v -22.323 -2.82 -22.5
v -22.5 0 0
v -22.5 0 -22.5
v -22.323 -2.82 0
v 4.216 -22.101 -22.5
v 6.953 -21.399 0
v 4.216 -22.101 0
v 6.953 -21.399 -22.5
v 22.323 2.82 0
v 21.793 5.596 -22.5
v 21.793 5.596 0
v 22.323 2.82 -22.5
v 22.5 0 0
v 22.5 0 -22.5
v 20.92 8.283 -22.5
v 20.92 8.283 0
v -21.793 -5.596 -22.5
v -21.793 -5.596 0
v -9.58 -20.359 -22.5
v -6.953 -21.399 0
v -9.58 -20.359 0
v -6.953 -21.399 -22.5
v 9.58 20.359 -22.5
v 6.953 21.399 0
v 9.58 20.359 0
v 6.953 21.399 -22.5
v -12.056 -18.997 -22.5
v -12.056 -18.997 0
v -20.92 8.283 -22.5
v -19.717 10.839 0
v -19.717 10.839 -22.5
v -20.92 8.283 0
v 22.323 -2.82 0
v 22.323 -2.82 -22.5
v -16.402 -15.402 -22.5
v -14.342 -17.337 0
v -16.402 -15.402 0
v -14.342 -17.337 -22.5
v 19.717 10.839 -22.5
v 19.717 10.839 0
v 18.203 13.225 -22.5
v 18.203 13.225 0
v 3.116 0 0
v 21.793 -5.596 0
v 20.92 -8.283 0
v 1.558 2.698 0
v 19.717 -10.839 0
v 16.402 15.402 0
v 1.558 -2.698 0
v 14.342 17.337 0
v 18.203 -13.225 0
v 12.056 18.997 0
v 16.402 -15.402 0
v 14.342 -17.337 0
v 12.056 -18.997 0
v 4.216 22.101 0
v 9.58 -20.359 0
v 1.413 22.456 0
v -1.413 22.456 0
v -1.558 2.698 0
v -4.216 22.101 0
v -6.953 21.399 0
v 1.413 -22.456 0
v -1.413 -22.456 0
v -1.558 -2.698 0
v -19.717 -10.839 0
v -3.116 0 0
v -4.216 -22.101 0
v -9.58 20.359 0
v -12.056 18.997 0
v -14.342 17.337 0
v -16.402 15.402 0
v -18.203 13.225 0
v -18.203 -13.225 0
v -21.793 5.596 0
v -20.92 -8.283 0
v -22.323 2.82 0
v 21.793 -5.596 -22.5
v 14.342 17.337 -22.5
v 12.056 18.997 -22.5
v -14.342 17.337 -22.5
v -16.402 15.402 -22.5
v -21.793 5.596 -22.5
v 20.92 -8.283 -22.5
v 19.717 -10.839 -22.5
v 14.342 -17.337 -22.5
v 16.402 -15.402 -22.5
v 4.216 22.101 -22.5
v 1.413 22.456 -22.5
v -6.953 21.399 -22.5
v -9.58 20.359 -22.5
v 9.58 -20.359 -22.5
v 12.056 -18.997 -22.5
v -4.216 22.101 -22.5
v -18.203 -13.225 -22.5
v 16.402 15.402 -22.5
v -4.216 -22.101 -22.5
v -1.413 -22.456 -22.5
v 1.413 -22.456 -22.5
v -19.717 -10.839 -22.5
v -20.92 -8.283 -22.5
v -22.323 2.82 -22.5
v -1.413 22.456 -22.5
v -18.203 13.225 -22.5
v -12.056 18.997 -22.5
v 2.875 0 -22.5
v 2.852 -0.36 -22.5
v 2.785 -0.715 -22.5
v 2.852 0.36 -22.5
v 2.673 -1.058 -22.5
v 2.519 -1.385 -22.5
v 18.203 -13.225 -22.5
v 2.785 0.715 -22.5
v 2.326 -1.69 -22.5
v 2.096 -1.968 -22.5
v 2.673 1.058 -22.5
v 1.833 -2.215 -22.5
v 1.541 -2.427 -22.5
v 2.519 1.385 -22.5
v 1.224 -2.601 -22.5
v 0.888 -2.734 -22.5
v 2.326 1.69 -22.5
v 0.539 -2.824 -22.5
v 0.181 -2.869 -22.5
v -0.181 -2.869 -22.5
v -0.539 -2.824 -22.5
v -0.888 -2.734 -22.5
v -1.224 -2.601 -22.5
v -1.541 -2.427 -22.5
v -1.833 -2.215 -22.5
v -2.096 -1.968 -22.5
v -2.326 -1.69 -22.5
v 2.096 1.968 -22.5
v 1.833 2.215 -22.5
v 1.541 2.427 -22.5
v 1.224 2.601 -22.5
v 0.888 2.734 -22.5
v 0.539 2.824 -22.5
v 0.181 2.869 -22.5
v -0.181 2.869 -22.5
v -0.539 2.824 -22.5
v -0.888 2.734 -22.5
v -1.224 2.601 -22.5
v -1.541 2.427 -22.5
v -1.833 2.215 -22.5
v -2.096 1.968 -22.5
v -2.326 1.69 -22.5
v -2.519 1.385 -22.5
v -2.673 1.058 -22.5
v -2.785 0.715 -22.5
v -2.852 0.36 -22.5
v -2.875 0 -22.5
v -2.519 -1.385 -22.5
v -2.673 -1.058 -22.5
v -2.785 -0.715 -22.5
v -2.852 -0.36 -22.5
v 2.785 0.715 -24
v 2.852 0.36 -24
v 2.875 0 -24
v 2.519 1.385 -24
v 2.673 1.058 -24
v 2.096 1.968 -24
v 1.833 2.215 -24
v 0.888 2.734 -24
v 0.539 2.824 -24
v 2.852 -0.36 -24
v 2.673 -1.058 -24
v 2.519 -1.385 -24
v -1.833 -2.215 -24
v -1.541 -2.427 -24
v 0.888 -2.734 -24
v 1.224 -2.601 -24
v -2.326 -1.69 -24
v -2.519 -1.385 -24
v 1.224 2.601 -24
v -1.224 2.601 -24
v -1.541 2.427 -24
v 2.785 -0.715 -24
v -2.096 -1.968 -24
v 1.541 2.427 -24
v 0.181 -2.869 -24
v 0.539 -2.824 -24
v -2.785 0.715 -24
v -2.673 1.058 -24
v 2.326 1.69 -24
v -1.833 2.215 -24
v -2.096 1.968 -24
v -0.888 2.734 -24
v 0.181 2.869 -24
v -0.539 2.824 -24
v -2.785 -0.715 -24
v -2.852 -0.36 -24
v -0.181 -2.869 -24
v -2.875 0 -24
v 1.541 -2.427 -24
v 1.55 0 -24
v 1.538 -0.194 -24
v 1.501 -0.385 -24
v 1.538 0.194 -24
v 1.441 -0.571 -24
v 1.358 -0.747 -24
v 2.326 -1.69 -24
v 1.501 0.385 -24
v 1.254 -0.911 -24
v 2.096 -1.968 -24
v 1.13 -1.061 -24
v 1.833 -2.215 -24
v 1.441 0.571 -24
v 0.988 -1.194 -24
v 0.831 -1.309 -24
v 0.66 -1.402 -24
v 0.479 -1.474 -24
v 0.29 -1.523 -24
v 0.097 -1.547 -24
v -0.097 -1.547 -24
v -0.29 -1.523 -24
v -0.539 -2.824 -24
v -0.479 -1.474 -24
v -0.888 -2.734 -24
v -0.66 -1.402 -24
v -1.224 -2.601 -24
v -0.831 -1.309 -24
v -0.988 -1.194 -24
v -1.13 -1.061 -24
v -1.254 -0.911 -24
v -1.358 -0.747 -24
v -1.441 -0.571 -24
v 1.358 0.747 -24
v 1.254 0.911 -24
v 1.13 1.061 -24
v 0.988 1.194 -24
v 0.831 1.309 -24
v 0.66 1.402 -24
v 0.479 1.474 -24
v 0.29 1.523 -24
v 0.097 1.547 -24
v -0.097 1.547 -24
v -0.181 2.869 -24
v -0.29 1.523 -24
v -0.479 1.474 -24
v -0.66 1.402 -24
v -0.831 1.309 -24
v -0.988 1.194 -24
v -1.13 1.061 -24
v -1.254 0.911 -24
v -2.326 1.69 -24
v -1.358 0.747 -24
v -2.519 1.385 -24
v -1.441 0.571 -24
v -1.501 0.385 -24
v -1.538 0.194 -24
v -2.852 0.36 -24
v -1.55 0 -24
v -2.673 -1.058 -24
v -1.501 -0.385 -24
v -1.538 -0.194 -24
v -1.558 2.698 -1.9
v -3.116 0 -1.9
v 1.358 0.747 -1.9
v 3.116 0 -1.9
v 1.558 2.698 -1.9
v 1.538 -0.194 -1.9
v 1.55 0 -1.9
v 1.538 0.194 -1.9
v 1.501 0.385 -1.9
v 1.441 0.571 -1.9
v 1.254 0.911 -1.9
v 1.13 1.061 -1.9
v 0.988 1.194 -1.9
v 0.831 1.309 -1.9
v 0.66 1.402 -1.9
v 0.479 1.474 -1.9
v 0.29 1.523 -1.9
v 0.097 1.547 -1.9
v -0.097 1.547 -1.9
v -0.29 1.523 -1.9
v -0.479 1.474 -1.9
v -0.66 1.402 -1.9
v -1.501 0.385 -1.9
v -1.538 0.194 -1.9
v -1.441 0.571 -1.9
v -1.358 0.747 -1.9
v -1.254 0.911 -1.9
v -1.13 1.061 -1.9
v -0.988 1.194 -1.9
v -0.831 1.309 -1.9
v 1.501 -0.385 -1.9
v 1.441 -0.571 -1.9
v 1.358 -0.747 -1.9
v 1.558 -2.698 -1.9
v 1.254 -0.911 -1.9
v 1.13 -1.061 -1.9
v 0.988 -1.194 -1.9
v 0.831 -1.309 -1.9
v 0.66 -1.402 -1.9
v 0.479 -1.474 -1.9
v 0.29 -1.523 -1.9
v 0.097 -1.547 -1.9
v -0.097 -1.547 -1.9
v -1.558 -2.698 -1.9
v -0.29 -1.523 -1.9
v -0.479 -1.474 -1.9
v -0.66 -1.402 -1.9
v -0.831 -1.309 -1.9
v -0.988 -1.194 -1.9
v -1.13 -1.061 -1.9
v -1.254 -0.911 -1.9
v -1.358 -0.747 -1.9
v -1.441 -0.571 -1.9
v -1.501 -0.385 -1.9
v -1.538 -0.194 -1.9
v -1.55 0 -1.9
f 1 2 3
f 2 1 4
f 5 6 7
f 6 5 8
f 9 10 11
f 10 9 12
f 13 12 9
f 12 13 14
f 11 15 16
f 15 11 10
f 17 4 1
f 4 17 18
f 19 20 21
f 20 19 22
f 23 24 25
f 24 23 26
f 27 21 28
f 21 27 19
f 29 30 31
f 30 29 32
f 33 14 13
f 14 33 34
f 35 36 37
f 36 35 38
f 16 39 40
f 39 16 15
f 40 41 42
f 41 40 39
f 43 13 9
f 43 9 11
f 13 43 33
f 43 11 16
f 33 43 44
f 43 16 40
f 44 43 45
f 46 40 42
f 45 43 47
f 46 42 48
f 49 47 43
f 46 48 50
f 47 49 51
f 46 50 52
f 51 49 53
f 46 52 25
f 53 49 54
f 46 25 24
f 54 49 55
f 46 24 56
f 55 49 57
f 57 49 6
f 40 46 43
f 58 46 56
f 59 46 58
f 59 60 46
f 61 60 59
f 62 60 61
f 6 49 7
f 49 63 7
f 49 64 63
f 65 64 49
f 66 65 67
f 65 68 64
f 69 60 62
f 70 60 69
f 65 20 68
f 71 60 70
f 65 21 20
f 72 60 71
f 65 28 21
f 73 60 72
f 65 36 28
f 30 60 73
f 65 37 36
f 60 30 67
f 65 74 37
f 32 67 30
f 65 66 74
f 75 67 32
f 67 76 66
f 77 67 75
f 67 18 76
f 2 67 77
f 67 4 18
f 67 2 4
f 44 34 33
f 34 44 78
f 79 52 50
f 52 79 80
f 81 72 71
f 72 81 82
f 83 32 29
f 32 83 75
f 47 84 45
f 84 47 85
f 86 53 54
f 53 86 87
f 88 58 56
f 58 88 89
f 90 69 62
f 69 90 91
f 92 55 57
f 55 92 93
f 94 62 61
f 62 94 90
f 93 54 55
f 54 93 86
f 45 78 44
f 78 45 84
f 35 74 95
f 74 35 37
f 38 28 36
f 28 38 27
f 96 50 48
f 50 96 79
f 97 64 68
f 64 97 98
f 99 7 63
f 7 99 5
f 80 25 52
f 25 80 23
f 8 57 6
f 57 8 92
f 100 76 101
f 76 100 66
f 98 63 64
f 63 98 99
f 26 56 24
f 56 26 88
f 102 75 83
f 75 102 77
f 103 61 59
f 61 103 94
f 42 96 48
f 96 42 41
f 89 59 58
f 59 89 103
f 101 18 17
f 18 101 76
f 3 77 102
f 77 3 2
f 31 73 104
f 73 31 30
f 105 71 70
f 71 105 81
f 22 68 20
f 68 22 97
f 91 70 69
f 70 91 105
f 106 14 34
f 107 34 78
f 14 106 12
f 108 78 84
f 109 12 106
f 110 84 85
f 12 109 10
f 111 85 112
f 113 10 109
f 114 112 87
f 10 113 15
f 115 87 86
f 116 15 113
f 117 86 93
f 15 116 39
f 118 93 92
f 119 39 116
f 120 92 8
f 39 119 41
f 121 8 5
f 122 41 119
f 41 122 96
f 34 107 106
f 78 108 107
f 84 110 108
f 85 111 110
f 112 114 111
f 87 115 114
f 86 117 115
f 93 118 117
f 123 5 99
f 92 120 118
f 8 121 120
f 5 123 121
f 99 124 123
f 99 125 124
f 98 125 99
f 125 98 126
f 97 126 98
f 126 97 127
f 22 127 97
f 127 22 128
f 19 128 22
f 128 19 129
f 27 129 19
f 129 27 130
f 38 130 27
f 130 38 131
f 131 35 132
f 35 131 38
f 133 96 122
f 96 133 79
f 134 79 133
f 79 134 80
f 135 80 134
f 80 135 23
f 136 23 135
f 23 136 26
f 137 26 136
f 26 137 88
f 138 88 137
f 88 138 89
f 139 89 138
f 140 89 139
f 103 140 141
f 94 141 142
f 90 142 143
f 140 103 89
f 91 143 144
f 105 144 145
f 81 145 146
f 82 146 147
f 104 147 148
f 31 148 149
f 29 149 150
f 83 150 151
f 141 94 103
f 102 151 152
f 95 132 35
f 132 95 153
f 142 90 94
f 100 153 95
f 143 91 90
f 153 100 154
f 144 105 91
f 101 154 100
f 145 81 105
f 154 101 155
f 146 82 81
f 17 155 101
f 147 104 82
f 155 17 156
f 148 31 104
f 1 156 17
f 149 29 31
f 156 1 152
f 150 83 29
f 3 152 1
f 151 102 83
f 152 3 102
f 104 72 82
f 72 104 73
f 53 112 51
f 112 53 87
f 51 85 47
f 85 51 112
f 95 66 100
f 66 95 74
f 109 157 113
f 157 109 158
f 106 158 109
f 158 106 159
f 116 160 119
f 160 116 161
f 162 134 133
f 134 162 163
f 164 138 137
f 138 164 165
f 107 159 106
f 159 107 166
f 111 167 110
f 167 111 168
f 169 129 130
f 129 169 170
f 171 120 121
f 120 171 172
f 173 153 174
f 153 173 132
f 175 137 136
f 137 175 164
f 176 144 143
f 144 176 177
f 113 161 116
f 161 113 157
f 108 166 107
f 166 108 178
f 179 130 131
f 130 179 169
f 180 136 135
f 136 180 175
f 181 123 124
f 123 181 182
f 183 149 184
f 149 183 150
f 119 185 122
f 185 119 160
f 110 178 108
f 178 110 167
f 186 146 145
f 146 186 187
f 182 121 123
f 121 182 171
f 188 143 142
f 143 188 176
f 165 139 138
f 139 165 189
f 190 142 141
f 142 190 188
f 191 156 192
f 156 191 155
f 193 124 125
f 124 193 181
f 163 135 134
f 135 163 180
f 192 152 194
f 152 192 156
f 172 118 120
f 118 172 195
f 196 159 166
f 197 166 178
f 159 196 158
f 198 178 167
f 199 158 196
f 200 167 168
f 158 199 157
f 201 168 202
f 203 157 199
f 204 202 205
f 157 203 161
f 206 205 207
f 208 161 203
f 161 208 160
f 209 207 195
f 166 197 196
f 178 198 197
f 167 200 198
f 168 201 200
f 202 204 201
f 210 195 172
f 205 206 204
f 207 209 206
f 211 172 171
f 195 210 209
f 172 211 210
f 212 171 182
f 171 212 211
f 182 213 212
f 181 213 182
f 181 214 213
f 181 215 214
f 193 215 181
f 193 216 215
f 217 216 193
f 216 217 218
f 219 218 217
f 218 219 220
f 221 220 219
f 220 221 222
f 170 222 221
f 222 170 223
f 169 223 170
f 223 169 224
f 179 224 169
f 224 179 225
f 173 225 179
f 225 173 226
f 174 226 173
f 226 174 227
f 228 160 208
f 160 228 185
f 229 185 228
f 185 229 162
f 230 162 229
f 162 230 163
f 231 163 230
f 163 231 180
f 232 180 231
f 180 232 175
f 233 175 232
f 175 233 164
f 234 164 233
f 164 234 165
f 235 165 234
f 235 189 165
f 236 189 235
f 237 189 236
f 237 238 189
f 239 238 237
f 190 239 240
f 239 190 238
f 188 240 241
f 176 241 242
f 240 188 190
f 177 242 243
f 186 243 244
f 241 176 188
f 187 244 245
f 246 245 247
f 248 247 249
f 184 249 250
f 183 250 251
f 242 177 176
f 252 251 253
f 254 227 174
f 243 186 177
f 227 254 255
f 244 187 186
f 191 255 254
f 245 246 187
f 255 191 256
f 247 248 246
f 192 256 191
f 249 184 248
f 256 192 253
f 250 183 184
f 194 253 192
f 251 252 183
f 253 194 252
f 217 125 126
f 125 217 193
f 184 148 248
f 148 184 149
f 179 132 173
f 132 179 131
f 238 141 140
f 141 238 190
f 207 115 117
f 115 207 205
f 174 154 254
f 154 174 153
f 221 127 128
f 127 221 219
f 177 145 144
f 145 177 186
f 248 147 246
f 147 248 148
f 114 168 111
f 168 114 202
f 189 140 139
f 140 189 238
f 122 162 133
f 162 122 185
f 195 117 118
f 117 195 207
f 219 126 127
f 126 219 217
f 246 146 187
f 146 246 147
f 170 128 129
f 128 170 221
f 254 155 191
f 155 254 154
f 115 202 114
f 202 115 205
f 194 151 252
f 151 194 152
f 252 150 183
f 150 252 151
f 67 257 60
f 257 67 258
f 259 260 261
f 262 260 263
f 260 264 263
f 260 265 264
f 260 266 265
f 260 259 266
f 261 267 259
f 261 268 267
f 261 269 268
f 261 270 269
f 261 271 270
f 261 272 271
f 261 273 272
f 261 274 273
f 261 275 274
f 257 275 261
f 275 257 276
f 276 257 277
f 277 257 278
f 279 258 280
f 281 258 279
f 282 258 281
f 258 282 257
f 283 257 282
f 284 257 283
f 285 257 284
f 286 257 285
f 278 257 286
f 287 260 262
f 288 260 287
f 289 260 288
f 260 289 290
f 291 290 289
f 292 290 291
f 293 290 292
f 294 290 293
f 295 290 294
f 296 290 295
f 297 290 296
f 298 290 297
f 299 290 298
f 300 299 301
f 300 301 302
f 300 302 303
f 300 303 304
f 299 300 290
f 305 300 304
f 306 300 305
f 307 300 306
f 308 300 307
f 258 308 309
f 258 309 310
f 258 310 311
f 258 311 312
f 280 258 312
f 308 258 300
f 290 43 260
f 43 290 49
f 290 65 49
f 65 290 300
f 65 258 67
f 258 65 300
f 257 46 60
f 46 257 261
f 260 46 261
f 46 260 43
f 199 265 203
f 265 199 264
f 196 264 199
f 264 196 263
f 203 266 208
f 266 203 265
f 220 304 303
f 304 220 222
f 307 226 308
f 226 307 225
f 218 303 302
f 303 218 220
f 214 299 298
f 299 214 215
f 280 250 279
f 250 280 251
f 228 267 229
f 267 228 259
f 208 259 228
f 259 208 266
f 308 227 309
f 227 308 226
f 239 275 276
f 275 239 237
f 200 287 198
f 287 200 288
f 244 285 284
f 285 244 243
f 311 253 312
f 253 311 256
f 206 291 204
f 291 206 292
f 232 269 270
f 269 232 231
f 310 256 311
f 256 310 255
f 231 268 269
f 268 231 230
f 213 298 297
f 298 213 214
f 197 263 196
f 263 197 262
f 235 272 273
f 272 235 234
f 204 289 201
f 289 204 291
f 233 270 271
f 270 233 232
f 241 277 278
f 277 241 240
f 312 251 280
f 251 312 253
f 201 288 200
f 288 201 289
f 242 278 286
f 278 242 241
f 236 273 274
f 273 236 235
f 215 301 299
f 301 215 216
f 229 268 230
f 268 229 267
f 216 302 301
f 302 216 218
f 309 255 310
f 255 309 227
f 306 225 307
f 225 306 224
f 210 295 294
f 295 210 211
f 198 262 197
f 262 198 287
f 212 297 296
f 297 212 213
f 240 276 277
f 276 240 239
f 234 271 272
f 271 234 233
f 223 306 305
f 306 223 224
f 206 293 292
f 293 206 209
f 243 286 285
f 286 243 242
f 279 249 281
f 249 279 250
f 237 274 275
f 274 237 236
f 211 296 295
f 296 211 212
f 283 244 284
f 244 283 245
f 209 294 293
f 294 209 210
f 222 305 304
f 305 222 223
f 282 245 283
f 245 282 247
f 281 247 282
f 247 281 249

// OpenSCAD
$fn = 50;

difference() {
	union() {
		translate(v = [0, 0, -22.5]) {
			cylinder(h = 22.5, r = 22.5);
		}
		#translate(v = [0, 0, -24.0]) {
			cylinder(h = 24, r = 2.875);
		}
	}
	union() {
		translate(v = [0, 0, 0]) {
			rotate(a = [0, 0, 0]) {
				difference() {
					union() {
						translate(v = [0, 0, -1.9]) {
							linear_extrude(height = 1.9) {
								polygon(points = [[3.1158, 0.0], [1.5579000000000005, 2.698361953111554], [-1.5578999999999994, 2.6983619531115544], [-3.1158, 3.815754496783323e-16], [-1.5579000000000014, -2.6983619531115535], [1.557899999999998, -2.6983619531115552]]);
							}
						}
					}
					union();
				}
			}
		}
		#translate(v = [0, 0, -100.0]) {
			cylinder(h = 200, r = 1.55);
		}
	}
}
